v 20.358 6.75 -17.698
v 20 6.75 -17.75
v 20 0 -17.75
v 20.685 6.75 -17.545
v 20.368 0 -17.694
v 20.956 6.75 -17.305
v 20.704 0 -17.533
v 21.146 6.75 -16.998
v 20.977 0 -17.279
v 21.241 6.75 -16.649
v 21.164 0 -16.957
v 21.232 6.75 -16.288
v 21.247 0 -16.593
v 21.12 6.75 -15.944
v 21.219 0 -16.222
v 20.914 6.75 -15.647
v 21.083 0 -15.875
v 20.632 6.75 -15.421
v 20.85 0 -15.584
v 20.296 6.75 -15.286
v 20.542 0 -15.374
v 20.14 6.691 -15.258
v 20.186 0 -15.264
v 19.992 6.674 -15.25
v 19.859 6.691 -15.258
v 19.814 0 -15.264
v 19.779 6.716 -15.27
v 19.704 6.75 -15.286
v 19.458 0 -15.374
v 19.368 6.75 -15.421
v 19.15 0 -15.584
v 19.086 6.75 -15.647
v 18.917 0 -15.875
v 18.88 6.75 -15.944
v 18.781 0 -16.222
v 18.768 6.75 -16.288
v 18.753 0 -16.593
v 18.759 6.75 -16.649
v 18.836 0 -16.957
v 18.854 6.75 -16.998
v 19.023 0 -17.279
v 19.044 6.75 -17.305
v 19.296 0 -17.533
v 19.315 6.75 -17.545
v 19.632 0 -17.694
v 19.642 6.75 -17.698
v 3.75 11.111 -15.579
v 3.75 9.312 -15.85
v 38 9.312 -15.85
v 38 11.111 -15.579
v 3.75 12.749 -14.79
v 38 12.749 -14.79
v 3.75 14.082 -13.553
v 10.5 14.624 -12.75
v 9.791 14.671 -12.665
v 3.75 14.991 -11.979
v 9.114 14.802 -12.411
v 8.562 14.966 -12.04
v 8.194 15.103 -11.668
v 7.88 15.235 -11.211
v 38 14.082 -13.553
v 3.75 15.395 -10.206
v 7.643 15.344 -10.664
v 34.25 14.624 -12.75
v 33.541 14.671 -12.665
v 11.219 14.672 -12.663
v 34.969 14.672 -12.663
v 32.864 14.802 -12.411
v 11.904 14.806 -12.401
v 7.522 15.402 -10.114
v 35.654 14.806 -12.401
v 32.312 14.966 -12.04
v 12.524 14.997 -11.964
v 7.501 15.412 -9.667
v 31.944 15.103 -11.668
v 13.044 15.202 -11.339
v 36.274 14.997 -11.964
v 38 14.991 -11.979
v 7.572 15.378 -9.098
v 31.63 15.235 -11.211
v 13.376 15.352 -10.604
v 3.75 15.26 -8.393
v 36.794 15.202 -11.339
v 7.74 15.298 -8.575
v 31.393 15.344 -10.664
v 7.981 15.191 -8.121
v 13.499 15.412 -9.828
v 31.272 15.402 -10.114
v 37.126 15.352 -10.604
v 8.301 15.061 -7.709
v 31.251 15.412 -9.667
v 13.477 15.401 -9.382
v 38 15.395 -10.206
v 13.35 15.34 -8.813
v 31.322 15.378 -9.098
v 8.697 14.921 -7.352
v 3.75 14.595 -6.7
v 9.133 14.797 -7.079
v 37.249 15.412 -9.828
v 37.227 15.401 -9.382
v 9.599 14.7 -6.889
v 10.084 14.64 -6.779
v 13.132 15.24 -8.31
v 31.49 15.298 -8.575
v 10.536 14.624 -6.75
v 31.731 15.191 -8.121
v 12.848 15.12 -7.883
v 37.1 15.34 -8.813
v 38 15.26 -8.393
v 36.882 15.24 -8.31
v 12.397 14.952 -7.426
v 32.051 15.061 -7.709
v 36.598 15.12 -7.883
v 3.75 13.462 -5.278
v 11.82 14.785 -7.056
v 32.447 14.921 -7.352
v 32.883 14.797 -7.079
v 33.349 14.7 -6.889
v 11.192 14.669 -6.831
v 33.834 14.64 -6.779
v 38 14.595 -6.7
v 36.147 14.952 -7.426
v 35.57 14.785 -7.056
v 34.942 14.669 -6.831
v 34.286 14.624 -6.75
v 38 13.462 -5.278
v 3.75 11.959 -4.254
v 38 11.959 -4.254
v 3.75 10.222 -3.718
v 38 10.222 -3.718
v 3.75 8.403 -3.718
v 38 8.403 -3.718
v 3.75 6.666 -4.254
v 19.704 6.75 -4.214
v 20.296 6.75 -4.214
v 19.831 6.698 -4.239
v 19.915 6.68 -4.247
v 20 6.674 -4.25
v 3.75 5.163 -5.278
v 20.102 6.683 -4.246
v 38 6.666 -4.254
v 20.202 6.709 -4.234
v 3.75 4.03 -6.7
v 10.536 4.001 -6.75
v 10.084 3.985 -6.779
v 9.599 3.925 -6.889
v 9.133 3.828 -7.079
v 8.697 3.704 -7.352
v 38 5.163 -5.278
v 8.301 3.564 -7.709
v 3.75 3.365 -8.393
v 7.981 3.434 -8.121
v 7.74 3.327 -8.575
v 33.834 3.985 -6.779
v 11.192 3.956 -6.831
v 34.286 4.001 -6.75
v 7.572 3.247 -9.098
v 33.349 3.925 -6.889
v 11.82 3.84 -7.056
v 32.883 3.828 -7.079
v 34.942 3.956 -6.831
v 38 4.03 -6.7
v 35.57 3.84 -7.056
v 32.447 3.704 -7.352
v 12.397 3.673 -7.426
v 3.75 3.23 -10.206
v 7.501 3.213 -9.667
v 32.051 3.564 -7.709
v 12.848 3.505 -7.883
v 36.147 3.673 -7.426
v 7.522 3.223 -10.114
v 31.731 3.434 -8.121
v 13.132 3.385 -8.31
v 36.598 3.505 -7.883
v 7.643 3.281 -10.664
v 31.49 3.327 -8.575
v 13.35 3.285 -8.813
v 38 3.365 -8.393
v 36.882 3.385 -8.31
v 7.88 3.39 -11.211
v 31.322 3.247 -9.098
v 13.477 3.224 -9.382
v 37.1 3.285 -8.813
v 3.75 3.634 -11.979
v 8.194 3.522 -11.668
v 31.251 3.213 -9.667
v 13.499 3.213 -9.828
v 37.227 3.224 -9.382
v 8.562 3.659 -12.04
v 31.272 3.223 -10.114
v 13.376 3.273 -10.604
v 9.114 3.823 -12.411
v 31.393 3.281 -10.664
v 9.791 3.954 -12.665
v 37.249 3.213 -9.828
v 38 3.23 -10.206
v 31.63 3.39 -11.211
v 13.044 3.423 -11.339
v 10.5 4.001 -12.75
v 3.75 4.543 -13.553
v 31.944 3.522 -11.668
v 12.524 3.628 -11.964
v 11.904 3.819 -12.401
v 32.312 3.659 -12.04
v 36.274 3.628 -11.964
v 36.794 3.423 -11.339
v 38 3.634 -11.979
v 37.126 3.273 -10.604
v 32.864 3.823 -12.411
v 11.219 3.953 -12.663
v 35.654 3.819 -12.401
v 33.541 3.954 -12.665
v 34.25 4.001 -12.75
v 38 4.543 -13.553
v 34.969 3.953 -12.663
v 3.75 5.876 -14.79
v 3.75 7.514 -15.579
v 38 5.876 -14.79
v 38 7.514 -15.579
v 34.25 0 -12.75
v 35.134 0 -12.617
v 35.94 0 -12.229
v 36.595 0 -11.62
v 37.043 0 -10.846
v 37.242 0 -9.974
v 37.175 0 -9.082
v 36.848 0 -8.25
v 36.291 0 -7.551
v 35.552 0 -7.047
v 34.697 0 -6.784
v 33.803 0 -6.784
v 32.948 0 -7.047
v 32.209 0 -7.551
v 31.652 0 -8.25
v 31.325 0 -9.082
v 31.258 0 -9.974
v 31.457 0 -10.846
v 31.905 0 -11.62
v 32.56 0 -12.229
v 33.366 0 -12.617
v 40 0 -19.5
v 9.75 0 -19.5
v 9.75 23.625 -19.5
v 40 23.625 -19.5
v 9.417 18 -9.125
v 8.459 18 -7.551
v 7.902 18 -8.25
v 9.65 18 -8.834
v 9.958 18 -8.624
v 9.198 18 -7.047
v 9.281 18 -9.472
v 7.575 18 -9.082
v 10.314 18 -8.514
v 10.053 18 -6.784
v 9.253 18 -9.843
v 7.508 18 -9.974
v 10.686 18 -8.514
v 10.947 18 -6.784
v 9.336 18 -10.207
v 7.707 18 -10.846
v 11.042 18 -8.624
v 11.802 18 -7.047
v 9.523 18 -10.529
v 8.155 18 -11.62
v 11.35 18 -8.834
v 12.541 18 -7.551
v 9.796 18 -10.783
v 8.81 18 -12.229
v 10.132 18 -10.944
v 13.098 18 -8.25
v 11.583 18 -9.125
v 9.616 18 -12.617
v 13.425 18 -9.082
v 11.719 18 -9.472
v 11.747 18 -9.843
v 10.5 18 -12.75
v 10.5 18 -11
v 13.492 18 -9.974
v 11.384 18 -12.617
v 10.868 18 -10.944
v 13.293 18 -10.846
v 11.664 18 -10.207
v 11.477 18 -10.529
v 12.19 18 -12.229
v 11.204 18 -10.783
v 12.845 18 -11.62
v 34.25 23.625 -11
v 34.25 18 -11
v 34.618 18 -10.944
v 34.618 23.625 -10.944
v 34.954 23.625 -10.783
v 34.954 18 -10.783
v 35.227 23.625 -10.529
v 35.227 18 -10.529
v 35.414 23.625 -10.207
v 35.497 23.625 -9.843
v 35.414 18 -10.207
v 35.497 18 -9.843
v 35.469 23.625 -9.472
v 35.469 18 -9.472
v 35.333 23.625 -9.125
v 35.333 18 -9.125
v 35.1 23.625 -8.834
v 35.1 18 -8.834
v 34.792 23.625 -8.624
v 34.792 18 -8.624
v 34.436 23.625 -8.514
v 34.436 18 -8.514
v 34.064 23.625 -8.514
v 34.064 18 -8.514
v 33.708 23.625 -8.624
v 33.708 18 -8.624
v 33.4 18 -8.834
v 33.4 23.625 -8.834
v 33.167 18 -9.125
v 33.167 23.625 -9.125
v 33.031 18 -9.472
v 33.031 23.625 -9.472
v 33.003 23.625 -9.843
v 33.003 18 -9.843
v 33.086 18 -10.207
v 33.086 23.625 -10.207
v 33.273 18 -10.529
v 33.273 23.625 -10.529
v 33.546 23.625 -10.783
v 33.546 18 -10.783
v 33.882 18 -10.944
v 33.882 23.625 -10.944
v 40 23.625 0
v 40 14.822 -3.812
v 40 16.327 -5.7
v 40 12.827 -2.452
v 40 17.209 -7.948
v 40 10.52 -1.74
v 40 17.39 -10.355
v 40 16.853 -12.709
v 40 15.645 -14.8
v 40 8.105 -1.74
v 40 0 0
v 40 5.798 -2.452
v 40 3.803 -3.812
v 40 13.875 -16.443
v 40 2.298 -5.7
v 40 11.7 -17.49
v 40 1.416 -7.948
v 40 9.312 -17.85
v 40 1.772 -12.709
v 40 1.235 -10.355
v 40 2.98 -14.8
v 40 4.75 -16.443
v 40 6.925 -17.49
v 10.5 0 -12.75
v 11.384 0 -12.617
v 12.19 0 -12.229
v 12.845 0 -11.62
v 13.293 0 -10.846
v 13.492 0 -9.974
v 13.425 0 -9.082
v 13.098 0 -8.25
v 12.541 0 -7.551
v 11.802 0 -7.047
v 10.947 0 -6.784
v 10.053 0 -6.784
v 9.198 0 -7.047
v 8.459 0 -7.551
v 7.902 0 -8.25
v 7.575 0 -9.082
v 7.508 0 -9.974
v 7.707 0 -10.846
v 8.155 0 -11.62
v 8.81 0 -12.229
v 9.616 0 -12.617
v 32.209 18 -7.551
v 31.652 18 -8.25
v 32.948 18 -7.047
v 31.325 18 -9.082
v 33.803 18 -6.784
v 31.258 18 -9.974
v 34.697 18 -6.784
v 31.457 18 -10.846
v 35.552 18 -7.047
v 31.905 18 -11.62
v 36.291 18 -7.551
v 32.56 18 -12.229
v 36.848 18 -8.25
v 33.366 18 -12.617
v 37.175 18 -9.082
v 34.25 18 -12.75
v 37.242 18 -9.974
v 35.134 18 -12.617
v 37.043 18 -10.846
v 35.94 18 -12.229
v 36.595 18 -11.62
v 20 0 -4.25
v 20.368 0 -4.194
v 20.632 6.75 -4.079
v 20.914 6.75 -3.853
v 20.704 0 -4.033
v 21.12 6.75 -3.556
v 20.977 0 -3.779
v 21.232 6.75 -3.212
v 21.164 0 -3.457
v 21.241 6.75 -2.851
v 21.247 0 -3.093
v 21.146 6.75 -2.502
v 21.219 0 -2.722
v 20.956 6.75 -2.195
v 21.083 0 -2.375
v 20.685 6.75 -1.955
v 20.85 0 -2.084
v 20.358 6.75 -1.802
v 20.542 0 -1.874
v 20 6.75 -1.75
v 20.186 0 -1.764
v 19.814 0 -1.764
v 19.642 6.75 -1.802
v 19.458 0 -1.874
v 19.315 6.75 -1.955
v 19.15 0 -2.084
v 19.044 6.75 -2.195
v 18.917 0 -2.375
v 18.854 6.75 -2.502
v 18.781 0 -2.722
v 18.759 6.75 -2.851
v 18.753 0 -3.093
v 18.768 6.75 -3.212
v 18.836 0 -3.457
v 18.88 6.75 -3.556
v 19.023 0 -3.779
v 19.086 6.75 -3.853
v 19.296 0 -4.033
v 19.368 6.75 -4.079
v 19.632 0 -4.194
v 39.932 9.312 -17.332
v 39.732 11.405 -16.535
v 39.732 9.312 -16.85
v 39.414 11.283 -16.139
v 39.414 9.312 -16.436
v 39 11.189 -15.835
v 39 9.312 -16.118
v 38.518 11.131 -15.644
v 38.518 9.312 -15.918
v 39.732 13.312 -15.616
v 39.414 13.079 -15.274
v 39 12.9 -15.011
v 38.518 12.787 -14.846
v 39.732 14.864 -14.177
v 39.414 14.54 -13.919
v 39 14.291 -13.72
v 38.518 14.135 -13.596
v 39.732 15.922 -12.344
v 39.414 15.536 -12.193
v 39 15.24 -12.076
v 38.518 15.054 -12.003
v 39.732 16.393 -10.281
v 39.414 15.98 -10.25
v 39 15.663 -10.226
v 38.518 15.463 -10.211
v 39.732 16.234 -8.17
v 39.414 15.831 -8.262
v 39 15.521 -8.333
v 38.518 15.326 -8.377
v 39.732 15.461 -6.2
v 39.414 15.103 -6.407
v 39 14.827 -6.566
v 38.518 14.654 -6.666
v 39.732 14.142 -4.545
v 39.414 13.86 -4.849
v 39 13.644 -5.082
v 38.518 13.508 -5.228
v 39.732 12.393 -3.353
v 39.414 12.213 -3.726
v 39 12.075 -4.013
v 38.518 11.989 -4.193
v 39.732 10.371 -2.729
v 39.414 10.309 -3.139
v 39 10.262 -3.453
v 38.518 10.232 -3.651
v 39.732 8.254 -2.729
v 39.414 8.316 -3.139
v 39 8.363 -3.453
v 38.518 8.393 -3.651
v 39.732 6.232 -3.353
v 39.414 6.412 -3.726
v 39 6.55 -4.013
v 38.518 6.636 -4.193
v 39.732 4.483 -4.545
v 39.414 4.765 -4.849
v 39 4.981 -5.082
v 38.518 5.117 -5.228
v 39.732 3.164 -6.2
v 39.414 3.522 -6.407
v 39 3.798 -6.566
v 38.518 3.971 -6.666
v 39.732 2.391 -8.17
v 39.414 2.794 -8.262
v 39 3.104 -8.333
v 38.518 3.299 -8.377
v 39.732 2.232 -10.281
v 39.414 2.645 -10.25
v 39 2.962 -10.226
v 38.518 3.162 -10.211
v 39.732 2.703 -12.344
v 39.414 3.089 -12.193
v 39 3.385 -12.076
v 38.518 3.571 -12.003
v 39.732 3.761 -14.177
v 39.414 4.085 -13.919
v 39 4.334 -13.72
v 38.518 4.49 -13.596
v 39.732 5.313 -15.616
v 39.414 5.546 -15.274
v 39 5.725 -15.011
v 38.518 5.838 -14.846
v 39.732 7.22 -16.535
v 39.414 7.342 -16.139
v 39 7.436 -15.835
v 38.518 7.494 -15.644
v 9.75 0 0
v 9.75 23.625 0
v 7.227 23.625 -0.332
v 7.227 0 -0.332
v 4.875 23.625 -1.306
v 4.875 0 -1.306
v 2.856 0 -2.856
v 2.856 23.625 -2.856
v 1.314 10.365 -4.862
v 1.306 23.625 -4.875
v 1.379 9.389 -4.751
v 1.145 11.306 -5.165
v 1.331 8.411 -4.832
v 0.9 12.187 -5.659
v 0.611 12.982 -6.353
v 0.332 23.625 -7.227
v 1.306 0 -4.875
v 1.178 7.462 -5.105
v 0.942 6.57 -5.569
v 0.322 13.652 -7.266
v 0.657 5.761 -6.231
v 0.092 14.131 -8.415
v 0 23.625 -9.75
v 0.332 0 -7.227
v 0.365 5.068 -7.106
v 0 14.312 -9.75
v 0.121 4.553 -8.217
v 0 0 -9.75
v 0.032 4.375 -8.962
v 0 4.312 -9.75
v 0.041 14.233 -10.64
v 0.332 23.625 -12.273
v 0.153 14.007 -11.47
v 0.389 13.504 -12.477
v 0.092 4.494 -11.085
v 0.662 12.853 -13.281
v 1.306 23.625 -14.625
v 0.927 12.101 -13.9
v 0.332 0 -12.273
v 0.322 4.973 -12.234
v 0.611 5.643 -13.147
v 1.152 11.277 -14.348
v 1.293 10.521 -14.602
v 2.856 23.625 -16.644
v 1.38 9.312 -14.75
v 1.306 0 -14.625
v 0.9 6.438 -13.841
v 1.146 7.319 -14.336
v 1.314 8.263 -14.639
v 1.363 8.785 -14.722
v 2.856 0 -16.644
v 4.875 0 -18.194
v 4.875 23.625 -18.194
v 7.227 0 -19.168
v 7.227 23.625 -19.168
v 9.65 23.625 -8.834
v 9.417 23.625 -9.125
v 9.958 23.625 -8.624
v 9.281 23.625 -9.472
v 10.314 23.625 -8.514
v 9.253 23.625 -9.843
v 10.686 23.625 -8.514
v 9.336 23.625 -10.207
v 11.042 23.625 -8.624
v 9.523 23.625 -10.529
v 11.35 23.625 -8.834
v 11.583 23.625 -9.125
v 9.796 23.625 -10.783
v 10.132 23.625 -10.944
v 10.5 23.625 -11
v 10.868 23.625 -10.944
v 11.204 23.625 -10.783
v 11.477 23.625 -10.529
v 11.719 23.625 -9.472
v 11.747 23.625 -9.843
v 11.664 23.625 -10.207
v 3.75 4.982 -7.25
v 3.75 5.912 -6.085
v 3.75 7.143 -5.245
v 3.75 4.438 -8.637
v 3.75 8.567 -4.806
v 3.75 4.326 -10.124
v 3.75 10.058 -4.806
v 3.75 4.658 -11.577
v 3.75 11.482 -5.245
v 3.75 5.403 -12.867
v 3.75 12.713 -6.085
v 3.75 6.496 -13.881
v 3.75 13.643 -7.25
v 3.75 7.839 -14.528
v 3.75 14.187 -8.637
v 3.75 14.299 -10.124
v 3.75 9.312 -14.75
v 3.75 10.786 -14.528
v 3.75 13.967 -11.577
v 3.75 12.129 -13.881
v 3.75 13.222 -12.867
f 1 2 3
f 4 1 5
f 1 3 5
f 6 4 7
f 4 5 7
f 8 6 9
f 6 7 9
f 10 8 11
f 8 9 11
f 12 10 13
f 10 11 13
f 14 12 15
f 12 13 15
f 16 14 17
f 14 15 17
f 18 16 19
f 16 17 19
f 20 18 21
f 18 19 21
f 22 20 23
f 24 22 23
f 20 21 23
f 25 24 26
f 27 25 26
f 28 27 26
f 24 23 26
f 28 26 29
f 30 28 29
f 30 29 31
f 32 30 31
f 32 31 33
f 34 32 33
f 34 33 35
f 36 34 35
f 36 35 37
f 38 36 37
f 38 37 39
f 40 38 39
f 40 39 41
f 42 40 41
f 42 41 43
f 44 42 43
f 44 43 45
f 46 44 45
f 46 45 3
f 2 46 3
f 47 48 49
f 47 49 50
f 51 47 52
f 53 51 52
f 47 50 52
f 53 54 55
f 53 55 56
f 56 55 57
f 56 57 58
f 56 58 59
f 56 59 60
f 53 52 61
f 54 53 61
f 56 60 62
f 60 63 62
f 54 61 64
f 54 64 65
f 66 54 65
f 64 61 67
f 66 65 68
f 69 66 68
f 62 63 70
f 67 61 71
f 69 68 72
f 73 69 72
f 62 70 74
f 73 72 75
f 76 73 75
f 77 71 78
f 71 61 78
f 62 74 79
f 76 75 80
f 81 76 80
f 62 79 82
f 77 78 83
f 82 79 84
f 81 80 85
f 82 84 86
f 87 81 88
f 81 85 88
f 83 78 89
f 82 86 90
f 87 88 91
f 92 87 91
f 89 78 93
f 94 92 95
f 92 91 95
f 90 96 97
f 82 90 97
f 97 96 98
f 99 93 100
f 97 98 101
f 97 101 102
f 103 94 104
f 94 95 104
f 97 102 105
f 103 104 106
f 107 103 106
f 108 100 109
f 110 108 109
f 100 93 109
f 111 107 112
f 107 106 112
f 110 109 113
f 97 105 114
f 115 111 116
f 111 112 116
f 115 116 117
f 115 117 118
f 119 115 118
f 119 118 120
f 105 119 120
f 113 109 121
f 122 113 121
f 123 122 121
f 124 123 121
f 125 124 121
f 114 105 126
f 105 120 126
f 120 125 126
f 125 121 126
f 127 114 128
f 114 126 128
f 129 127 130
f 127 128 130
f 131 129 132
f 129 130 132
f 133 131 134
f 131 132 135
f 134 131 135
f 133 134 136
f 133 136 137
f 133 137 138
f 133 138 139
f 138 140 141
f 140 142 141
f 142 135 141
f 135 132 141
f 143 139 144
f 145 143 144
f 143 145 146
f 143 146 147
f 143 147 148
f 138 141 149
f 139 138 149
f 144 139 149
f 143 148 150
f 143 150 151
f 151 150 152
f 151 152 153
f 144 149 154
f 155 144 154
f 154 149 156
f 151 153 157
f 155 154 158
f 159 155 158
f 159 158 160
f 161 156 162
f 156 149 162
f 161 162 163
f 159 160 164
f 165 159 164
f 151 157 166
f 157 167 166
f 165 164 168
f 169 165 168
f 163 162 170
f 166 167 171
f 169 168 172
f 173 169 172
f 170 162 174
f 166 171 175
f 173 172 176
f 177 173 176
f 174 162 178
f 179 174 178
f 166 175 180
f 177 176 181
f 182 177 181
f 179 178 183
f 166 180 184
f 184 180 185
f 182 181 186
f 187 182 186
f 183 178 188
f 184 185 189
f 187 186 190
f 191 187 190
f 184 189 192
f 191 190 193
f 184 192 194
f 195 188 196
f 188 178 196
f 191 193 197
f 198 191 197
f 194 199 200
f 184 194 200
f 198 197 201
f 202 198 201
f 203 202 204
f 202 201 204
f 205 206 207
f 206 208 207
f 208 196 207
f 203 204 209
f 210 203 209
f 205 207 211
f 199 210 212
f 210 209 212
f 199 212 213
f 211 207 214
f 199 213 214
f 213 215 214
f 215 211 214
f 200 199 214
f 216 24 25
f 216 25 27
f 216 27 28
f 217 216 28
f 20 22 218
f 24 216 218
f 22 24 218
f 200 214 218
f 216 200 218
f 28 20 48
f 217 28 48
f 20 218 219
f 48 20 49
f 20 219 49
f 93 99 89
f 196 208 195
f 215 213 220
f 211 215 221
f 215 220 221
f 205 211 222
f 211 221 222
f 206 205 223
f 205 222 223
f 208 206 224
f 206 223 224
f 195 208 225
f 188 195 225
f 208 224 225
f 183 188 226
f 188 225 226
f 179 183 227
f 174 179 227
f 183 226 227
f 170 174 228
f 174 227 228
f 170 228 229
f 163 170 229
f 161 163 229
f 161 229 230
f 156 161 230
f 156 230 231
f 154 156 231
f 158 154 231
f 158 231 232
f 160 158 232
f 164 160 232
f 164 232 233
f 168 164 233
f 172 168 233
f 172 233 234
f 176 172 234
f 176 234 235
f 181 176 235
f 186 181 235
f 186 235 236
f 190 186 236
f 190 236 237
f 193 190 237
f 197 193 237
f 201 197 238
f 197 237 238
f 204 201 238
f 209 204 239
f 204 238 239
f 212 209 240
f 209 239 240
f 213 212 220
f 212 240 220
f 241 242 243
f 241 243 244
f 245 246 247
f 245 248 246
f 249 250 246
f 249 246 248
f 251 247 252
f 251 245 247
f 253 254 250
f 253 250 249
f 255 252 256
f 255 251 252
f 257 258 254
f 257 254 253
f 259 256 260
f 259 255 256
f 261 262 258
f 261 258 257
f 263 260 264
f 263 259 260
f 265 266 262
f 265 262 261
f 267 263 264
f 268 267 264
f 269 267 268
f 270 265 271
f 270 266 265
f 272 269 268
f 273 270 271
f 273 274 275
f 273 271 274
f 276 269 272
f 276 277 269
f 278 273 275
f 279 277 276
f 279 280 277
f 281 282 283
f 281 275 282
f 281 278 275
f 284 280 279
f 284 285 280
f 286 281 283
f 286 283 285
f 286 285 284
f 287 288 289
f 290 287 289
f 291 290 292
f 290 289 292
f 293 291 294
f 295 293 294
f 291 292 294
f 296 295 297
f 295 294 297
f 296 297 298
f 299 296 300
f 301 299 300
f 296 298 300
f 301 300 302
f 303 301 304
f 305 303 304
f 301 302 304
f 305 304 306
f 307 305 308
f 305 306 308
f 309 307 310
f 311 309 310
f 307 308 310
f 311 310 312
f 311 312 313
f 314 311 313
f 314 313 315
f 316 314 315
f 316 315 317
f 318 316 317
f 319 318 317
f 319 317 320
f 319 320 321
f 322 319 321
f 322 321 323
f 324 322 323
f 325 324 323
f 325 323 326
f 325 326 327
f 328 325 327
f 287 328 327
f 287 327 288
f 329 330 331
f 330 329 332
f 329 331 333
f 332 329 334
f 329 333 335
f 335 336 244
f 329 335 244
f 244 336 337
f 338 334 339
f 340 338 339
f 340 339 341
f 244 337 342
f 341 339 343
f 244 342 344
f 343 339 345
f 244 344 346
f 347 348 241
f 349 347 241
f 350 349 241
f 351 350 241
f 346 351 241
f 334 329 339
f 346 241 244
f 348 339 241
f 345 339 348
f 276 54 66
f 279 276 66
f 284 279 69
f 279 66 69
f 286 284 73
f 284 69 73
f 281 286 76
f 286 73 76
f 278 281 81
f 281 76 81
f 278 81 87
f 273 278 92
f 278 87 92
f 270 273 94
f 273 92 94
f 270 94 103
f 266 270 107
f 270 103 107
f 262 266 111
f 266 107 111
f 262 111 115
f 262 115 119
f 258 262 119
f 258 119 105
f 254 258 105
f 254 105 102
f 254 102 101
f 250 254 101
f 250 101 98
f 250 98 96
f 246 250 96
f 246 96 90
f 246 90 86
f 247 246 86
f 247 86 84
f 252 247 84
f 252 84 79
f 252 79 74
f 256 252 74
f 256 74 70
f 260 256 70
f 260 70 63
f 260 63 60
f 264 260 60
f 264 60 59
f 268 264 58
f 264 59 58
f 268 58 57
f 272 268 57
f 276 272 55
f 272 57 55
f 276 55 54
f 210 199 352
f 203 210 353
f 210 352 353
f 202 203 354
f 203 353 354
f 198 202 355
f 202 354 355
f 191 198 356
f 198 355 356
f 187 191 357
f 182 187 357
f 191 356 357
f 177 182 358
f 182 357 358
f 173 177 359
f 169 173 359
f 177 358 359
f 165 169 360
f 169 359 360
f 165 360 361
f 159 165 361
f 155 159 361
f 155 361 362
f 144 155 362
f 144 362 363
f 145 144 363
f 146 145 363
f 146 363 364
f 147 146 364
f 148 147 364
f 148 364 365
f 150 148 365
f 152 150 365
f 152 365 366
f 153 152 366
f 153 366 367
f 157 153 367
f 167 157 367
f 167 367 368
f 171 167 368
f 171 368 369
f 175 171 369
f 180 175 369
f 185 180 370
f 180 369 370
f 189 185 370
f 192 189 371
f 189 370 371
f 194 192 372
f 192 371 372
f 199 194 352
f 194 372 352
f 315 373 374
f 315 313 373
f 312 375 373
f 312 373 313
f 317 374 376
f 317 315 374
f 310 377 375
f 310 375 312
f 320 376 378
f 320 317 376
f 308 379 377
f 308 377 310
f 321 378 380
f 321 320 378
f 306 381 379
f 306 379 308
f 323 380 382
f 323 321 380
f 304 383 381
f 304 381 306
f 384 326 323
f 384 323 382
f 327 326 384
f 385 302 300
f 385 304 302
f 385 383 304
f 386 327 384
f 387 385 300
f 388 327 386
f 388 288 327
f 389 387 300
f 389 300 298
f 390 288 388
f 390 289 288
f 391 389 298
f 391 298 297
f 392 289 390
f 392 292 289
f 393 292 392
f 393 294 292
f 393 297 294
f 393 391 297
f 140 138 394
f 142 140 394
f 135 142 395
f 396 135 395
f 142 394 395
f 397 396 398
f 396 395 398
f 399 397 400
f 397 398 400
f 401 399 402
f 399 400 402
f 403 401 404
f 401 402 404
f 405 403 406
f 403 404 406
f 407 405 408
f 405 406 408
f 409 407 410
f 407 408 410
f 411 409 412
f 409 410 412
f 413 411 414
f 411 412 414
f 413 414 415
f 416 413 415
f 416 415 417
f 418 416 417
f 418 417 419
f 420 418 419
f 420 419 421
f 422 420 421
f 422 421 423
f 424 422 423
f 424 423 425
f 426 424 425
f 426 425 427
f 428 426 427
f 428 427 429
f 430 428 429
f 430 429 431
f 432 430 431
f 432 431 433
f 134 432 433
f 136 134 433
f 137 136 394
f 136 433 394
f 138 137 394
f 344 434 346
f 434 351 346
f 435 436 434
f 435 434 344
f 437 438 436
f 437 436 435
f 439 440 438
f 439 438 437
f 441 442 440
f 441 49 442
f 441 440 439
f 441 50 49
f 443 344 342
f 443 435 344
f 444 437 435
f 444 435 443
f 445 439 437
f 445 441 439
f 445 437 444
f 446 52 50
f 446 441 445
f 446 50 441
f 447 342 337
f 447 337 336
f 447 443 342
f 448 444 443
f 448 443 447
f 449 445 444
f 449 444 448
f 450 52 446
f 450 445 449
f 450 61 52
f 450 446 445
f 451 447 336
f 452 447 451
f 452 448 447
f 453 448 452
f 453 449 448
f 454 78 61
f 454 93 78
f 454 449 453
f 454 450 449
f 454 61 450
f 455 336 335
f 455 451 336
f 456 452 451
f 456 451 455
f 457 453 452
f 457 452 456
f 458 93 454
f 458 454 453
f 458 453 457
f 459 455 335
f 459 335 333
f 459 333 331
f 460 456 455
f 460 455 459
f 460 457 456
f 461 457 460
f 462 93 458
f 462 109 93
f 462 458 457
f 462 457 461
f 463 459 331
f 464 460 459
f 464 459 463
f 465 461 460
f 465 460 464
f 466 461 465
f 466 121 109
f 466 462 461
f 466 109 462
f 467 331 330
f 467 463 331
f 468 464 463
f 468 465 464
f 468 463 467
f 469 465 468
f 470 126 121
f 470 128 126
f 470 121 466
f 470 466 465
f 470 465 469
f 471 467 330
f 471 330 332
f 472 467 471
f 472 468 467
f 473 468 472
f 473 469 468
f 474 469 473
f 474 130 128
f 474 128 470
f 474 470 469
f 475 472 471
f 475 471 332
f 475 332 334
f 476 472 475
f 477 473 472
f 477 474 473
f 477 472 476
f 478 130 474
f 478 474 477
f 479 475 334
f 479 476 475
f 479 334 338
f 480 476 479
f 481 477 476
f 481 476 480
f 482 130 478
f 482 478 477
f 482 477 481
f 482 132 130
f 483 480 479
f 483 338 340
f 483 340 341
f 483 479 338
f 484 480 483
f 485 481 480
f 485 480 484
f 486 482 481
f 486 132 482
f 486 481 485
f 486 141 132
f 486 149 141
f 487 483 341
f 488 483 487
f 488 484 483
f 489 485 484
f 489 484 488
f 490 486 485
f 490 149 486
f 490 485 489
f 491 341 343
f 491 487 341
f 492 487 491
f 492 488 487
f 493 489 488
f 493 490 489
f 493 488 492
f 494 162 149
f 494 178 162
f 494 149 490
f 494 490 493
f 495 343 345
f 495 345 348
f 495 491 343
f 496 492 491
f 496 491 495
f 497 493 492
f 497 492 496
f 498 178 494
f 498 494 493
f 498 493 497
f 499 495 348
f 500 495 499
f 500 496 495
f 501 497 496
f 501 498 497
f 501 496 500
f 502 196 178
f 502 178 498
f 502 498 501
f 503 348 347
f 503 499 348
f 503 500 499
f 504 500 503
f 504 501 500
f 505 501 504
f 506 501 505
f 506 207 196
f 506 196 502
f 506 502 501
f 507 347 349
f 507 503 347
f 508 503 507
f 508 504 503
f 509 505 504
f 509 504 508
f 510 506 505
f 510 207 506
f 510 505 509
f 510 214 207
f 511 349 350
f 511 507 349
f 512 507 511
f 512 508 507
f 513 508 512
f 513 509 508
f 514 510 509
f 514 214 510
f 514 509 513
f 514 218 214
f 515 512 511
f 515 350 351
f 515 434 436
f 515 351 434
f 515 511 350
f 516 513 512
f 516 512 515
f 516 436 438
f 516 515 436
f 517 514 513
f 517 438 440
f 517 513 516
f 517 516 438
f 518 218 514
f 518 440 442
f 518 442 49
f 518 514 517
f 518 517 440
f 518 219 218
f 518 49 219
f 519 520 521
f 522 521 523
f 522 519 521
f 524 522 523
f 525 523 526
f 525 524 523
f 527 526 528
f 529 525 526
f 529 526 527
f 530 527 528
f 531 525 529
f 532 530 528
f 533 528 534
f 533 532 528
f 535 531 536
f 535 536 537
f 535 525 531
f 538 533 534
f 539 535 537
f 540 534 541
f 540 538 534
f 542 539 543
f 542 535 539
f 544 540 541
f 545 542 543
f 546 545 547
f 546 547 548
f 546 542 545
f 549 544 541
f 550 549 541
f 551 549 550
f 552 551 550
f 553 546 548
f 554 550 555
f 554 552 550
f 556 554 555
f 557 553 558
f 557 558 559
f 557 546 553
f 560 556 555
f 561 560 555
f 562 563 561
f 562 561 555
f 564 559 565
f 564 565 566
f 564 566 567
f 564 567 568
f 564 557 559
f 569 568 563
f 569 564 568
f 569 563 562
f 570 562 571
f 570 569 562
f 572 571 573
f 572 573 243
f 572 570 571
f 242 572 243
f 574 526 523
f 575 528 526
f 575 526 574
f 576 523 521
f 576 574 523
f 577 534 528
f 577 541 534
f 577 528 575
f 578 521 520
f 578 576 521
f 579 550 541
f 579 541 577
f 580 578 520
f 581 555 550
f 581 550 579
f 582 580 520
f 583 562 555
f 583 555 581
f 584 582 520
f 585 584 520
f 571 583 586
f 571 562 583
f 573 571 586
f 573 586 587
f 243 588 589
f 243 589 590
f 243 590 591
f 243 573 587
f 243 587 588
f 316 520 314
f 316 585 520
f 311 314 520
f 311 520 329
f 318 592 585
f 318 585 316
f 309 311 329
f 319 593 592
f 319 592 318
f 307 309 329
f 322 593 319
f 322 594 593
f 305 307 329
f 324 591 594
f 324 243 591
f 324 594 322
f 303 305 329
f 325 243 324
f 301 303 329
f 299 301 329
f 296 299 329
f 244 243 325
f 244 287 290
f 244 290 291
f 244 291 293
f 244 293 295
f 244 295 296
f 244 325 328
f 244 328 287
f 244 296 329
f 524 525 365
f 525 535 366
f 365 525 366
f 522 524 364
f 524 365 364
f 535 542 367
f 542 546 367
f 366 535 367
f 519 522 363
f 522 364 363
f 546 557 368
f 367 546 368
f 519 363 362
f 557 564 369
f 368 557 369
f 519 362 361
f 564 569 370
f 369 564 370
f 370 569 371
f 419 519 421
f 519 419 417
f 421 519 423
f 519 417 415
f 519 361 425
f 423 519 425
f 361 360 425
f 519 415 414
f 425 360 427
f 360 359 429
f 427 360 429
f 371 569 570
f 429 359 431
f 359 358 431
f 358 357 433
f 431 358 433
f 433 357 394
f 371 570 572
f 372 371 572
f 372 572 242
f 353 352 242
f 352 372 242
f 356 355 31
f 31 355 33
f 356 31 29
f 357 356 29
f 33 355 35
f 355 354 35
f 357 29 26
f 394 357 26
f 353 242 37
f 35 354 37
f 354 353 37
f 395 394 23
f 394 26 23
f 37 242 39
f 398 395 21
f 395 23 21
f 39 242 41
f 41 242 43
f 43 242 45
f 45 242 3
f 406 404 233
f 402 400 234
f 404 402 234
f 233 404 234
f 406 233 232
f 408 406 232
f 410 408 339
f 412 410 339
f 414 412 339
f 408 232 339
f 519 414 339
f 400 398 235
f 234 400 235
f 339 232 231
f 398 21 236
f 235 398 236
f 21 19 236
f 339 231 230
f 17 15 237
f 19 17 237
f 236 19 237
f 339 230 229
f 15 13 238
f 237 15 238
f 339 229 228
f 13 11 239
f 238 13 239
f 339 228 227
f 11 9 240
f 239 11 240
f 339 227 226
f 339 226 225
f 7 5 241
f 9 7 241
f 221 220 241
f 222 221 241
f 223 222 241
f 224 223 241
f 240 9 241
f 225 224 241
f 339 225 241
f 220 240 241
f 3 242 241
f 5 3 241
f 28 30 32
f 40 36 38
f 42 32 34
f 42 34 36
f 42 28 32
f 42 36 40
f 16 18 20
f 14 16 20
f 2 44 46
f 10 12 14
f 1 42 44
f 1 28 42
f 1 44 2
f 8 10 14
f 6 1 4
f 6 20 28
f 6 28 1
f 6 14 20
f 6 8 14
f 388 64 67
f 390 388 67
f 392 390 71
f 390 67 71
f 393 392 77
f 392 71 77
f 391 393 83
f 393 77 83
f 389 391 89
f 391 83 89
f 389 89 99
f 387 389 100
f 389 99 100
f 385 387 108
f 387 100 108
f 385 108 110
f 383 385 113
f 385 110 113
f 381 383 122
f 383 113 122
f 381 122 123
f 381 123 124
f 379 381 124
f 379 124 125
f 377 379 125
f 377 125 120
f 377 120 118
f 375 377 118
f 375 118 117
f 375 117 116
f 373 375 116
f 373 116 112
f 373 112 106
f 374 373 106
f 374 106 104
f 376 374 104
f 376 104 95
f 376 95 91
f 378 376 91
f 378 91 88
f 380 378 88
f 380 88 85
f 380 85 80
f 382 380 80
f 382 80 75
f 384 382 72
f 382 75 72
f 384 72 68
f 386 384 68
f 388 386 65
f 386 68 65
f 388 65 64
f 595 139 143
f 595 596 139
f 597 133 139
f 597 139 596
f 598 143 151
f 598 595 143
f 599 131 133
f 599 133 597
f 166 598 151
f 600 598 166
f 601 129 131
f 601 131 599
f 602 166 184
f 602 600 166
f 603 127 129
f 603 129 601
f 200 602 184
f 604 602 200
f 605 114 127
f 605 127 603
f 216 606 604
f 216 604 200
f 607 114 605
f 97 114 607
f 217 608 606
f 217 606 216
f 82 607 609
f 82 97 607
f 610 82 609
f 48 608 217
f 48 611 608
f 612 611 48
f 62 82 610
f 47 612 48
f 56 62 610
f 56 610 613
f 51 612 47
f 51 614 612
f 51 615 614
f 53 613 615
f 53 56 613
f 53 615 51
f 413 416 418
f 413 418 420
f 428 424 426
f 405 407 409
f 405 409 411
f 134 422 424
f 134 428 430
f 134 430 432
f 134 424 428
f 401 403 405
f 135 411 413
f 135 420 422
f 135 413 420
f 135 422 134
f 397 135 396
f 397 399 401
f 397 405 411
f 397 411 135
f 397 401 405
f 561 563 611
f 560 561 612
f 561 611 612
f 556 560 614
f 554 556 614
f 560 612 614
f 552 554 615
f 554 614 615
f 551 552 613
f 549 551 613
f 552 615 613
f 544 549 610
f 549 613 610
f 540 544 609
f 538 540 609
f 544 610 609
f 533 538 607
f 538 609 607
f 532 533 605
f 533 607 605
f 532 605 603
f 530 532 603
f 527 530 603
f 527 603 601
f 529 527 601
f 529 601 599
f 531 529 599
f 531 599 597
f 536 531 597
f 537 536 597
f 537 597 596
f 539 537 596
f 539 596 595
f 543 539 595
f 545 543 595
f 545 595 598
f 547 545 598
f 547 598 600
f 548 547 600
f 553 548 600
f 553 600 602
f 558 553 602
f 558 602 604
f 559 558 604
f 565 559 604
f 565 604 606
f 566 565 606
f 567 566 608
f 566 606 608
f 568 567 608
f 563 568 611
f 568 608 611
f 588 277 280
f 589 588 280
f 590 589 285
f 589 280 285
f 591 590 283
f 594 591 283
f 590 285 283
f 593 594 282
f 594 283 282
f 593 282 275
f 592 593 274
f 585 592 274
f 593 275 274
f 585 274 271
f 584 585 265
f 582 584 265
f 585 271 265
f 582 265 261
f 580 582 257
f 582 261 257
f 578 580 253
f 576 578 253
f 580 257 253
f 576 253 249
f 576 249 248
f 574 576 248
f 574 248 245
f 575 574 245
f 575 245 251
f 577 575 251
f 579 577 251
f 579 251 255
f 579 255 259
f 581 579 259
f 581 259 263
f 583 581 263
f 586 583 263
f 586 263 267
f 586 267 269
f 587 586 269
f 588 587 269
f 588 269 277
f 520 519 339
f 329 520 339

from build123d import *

# Parameters (mm, degrees)
SKETCH1_W           = 40
SKETCH1_H           = 19.5
BOSS_EXTRUDE1_DEPTH = 23.625
SKETCH2_R           = 6.1
CUT_EXTRUDE1_DEPTH  = 36.25
CUT_EXTRUDE2_REACH  = 49.46
SKETCH3_R           = 5
SKETCH5_R           = 3
CUT_EXTRUDE3_DEPTH  = 18
CUT_EXTRUDE4_REACH  = 50.003
SKETCH6_R           = 1.25
SKETCH7_R           = 1.25
CUT_EXTRUDE5_DEPTH  = 6.75
FILLET1_R           = 2
FILLET2_DEPTH       = 23.625


with BuildPart() as part:
    # Sketch1 → Boss-Extrude1 (new body)
    with BuildSketch(Plane(origin=(0, 0, 0), x_dir=(1, 0, 0), z_dir=(0, 1, 0))):
        with Locations((20, 9.75)):
            Rectangle(SKETCH1_W, SKETCH1_H)
    extrude(amount=BOSS_EXTRUDE1_DEPTH)

    # Sketch2 → Cut-Extrude1 (cut)
    with BuildSketch(Plane(origin=(40, 0, 0), x_dir=(0, 0, -1), z_dir=(1, 0, 0))):
        with Locations((9.75, 9.3125)):
            Circle(SKETCH2_R)
    extrude(amount=-CUT_EXTRUDE1_DEPTH, mode=Mode.SUBTRACT)

    # Sketch3 → Cut-Extrude2 (cut, up to next)
    with BuildSketch(Plane(origin=(3.75, 0, 0), x_dir=(0, 0, -1), z_dir=(1, 0, 0)), mode=Mode.PRIVATE) as cut_extrude2_sk1:
        with Locations((9.75, 9.3125)):
            Circle(SKETCH3_R)
    cut_extrude2_tool1 = extrude(cut_extrude2_sk1.sketch, amount=-CUT_EXTRUDE2_REACH, mode=Mode.PRIVATE) & part.part
    add(cut_extrude2_tool1.solids().sort_by_distance((3.75, 9.3125, -9.75))[0], mode=Mode.SUBTRACT)

    # Sketch5 → Cut-Extrude3 (cut)
    with BuildSketch(Plane.XZ):
        with Locations(Location((34.25, -9.75, 0), (0, 0, 270))):
            Circle(SKETCH5_R)
        with Locations(Location((10.5, -9.75, 0), (0, 0, 270))):
            Circle(SKETCH5_R)
    extrude(amount=-CUT_EXTRUDE3_DEPTH, mode=Mode.SUBTRACT)

    # Sketch6 → Cut-Extrude4 (cut, up to next)
    with BuildSketch(Plane.XZ.offset(-18), mode=Mode.PRIVATE) as cut_extrude4_sk1:
        with Locations(Location((10.5, -9.75, 0), (0, 0, 270))):
            Circle(SKETCH6_R)
    cut_extrude4_tool1 = extrude(cut_extrude4_sk1.sketch, amount=-CUT_EXTRUDE4_REACH, mode=Mode.PRIVATE) & part.part
    # Sketch6 → Cut-Extrude4 (cut, up to next)
    with BuildSketch(Plane.XZ.offset(-18), mode=Mode.PRIVATE) as cut_extrude4_sk2:
        with Locations(Location((34.25, -9.75, 0), (0, 0, 270))):
            Circle(SKETCH6_R)
    cut_extrude4_tool2 = extrude(cut_extrude4_sk2.sketch, amount=-CUT_EXTRUDE4_REACH, mode=Mode.PRIVATE) & part.part
    add(cut_extrude4_tool1.solids().sort_by_distance((10.5, 18, -9.75))[0], mode=Mode.SUBTRACT)
    add(cut_extrude4_tool2.solids().sort_by_distance((34.25, 18, -9.75))[0], mode=Mode.SUBTRACT)

    # Sketch7 → Cut-Extrude5 (cut)
    with BuildSketch(Plane.XZ):
        with Locations(Location((20, -3, 0), (0, 0, 270))):
            Circle(SKETCH7_R)
        with Locations(Location((20, -16.5, 0), (0, 0, 270))):
            Circle(SKETCH7_R)
    extrude(amount=-CUT_EXTRUDE5_DEPTH, mode=Mode.SUBTRACT)

    # Fillet1
    fillet1_edges = [part.edges().sort_by_distance(p)[0] for p in [
        (40, 9.3125, -3.65),
    ]]
    fillet(fillet1_edges, radius=FILLET1_R)

    # Fillet2: read off the stored shape, not the designer's step
    # Fillet2 outline → Fillet2 (cut)
    with BuildSketch(Plane(origin=(0, 0, 0), x_dir=(1, 0, 0), z_dir=(0, 1, 0))):
        with BuildLine():
            Line((0, 19.5), (0, 9.75))
            ThreePointArc((0, 9.75), (2.855708883, 16.644291117), (9.75, 19.5))
            Line((9.75, 19.5), (0, 19.5))
        make_face()
        with BuildLine():
            ThreePointArc((9.75, 0), (2.855708883, 2.855708883), (0, 9.75))
            Line((0, 9.75), (0, 0))
            Line((0, 0), (9.75, 0))
        make_face()
    extrude(amount=FILLET2_DEPTH, mode=Mode.SUBTRACT)


solid = part.part
